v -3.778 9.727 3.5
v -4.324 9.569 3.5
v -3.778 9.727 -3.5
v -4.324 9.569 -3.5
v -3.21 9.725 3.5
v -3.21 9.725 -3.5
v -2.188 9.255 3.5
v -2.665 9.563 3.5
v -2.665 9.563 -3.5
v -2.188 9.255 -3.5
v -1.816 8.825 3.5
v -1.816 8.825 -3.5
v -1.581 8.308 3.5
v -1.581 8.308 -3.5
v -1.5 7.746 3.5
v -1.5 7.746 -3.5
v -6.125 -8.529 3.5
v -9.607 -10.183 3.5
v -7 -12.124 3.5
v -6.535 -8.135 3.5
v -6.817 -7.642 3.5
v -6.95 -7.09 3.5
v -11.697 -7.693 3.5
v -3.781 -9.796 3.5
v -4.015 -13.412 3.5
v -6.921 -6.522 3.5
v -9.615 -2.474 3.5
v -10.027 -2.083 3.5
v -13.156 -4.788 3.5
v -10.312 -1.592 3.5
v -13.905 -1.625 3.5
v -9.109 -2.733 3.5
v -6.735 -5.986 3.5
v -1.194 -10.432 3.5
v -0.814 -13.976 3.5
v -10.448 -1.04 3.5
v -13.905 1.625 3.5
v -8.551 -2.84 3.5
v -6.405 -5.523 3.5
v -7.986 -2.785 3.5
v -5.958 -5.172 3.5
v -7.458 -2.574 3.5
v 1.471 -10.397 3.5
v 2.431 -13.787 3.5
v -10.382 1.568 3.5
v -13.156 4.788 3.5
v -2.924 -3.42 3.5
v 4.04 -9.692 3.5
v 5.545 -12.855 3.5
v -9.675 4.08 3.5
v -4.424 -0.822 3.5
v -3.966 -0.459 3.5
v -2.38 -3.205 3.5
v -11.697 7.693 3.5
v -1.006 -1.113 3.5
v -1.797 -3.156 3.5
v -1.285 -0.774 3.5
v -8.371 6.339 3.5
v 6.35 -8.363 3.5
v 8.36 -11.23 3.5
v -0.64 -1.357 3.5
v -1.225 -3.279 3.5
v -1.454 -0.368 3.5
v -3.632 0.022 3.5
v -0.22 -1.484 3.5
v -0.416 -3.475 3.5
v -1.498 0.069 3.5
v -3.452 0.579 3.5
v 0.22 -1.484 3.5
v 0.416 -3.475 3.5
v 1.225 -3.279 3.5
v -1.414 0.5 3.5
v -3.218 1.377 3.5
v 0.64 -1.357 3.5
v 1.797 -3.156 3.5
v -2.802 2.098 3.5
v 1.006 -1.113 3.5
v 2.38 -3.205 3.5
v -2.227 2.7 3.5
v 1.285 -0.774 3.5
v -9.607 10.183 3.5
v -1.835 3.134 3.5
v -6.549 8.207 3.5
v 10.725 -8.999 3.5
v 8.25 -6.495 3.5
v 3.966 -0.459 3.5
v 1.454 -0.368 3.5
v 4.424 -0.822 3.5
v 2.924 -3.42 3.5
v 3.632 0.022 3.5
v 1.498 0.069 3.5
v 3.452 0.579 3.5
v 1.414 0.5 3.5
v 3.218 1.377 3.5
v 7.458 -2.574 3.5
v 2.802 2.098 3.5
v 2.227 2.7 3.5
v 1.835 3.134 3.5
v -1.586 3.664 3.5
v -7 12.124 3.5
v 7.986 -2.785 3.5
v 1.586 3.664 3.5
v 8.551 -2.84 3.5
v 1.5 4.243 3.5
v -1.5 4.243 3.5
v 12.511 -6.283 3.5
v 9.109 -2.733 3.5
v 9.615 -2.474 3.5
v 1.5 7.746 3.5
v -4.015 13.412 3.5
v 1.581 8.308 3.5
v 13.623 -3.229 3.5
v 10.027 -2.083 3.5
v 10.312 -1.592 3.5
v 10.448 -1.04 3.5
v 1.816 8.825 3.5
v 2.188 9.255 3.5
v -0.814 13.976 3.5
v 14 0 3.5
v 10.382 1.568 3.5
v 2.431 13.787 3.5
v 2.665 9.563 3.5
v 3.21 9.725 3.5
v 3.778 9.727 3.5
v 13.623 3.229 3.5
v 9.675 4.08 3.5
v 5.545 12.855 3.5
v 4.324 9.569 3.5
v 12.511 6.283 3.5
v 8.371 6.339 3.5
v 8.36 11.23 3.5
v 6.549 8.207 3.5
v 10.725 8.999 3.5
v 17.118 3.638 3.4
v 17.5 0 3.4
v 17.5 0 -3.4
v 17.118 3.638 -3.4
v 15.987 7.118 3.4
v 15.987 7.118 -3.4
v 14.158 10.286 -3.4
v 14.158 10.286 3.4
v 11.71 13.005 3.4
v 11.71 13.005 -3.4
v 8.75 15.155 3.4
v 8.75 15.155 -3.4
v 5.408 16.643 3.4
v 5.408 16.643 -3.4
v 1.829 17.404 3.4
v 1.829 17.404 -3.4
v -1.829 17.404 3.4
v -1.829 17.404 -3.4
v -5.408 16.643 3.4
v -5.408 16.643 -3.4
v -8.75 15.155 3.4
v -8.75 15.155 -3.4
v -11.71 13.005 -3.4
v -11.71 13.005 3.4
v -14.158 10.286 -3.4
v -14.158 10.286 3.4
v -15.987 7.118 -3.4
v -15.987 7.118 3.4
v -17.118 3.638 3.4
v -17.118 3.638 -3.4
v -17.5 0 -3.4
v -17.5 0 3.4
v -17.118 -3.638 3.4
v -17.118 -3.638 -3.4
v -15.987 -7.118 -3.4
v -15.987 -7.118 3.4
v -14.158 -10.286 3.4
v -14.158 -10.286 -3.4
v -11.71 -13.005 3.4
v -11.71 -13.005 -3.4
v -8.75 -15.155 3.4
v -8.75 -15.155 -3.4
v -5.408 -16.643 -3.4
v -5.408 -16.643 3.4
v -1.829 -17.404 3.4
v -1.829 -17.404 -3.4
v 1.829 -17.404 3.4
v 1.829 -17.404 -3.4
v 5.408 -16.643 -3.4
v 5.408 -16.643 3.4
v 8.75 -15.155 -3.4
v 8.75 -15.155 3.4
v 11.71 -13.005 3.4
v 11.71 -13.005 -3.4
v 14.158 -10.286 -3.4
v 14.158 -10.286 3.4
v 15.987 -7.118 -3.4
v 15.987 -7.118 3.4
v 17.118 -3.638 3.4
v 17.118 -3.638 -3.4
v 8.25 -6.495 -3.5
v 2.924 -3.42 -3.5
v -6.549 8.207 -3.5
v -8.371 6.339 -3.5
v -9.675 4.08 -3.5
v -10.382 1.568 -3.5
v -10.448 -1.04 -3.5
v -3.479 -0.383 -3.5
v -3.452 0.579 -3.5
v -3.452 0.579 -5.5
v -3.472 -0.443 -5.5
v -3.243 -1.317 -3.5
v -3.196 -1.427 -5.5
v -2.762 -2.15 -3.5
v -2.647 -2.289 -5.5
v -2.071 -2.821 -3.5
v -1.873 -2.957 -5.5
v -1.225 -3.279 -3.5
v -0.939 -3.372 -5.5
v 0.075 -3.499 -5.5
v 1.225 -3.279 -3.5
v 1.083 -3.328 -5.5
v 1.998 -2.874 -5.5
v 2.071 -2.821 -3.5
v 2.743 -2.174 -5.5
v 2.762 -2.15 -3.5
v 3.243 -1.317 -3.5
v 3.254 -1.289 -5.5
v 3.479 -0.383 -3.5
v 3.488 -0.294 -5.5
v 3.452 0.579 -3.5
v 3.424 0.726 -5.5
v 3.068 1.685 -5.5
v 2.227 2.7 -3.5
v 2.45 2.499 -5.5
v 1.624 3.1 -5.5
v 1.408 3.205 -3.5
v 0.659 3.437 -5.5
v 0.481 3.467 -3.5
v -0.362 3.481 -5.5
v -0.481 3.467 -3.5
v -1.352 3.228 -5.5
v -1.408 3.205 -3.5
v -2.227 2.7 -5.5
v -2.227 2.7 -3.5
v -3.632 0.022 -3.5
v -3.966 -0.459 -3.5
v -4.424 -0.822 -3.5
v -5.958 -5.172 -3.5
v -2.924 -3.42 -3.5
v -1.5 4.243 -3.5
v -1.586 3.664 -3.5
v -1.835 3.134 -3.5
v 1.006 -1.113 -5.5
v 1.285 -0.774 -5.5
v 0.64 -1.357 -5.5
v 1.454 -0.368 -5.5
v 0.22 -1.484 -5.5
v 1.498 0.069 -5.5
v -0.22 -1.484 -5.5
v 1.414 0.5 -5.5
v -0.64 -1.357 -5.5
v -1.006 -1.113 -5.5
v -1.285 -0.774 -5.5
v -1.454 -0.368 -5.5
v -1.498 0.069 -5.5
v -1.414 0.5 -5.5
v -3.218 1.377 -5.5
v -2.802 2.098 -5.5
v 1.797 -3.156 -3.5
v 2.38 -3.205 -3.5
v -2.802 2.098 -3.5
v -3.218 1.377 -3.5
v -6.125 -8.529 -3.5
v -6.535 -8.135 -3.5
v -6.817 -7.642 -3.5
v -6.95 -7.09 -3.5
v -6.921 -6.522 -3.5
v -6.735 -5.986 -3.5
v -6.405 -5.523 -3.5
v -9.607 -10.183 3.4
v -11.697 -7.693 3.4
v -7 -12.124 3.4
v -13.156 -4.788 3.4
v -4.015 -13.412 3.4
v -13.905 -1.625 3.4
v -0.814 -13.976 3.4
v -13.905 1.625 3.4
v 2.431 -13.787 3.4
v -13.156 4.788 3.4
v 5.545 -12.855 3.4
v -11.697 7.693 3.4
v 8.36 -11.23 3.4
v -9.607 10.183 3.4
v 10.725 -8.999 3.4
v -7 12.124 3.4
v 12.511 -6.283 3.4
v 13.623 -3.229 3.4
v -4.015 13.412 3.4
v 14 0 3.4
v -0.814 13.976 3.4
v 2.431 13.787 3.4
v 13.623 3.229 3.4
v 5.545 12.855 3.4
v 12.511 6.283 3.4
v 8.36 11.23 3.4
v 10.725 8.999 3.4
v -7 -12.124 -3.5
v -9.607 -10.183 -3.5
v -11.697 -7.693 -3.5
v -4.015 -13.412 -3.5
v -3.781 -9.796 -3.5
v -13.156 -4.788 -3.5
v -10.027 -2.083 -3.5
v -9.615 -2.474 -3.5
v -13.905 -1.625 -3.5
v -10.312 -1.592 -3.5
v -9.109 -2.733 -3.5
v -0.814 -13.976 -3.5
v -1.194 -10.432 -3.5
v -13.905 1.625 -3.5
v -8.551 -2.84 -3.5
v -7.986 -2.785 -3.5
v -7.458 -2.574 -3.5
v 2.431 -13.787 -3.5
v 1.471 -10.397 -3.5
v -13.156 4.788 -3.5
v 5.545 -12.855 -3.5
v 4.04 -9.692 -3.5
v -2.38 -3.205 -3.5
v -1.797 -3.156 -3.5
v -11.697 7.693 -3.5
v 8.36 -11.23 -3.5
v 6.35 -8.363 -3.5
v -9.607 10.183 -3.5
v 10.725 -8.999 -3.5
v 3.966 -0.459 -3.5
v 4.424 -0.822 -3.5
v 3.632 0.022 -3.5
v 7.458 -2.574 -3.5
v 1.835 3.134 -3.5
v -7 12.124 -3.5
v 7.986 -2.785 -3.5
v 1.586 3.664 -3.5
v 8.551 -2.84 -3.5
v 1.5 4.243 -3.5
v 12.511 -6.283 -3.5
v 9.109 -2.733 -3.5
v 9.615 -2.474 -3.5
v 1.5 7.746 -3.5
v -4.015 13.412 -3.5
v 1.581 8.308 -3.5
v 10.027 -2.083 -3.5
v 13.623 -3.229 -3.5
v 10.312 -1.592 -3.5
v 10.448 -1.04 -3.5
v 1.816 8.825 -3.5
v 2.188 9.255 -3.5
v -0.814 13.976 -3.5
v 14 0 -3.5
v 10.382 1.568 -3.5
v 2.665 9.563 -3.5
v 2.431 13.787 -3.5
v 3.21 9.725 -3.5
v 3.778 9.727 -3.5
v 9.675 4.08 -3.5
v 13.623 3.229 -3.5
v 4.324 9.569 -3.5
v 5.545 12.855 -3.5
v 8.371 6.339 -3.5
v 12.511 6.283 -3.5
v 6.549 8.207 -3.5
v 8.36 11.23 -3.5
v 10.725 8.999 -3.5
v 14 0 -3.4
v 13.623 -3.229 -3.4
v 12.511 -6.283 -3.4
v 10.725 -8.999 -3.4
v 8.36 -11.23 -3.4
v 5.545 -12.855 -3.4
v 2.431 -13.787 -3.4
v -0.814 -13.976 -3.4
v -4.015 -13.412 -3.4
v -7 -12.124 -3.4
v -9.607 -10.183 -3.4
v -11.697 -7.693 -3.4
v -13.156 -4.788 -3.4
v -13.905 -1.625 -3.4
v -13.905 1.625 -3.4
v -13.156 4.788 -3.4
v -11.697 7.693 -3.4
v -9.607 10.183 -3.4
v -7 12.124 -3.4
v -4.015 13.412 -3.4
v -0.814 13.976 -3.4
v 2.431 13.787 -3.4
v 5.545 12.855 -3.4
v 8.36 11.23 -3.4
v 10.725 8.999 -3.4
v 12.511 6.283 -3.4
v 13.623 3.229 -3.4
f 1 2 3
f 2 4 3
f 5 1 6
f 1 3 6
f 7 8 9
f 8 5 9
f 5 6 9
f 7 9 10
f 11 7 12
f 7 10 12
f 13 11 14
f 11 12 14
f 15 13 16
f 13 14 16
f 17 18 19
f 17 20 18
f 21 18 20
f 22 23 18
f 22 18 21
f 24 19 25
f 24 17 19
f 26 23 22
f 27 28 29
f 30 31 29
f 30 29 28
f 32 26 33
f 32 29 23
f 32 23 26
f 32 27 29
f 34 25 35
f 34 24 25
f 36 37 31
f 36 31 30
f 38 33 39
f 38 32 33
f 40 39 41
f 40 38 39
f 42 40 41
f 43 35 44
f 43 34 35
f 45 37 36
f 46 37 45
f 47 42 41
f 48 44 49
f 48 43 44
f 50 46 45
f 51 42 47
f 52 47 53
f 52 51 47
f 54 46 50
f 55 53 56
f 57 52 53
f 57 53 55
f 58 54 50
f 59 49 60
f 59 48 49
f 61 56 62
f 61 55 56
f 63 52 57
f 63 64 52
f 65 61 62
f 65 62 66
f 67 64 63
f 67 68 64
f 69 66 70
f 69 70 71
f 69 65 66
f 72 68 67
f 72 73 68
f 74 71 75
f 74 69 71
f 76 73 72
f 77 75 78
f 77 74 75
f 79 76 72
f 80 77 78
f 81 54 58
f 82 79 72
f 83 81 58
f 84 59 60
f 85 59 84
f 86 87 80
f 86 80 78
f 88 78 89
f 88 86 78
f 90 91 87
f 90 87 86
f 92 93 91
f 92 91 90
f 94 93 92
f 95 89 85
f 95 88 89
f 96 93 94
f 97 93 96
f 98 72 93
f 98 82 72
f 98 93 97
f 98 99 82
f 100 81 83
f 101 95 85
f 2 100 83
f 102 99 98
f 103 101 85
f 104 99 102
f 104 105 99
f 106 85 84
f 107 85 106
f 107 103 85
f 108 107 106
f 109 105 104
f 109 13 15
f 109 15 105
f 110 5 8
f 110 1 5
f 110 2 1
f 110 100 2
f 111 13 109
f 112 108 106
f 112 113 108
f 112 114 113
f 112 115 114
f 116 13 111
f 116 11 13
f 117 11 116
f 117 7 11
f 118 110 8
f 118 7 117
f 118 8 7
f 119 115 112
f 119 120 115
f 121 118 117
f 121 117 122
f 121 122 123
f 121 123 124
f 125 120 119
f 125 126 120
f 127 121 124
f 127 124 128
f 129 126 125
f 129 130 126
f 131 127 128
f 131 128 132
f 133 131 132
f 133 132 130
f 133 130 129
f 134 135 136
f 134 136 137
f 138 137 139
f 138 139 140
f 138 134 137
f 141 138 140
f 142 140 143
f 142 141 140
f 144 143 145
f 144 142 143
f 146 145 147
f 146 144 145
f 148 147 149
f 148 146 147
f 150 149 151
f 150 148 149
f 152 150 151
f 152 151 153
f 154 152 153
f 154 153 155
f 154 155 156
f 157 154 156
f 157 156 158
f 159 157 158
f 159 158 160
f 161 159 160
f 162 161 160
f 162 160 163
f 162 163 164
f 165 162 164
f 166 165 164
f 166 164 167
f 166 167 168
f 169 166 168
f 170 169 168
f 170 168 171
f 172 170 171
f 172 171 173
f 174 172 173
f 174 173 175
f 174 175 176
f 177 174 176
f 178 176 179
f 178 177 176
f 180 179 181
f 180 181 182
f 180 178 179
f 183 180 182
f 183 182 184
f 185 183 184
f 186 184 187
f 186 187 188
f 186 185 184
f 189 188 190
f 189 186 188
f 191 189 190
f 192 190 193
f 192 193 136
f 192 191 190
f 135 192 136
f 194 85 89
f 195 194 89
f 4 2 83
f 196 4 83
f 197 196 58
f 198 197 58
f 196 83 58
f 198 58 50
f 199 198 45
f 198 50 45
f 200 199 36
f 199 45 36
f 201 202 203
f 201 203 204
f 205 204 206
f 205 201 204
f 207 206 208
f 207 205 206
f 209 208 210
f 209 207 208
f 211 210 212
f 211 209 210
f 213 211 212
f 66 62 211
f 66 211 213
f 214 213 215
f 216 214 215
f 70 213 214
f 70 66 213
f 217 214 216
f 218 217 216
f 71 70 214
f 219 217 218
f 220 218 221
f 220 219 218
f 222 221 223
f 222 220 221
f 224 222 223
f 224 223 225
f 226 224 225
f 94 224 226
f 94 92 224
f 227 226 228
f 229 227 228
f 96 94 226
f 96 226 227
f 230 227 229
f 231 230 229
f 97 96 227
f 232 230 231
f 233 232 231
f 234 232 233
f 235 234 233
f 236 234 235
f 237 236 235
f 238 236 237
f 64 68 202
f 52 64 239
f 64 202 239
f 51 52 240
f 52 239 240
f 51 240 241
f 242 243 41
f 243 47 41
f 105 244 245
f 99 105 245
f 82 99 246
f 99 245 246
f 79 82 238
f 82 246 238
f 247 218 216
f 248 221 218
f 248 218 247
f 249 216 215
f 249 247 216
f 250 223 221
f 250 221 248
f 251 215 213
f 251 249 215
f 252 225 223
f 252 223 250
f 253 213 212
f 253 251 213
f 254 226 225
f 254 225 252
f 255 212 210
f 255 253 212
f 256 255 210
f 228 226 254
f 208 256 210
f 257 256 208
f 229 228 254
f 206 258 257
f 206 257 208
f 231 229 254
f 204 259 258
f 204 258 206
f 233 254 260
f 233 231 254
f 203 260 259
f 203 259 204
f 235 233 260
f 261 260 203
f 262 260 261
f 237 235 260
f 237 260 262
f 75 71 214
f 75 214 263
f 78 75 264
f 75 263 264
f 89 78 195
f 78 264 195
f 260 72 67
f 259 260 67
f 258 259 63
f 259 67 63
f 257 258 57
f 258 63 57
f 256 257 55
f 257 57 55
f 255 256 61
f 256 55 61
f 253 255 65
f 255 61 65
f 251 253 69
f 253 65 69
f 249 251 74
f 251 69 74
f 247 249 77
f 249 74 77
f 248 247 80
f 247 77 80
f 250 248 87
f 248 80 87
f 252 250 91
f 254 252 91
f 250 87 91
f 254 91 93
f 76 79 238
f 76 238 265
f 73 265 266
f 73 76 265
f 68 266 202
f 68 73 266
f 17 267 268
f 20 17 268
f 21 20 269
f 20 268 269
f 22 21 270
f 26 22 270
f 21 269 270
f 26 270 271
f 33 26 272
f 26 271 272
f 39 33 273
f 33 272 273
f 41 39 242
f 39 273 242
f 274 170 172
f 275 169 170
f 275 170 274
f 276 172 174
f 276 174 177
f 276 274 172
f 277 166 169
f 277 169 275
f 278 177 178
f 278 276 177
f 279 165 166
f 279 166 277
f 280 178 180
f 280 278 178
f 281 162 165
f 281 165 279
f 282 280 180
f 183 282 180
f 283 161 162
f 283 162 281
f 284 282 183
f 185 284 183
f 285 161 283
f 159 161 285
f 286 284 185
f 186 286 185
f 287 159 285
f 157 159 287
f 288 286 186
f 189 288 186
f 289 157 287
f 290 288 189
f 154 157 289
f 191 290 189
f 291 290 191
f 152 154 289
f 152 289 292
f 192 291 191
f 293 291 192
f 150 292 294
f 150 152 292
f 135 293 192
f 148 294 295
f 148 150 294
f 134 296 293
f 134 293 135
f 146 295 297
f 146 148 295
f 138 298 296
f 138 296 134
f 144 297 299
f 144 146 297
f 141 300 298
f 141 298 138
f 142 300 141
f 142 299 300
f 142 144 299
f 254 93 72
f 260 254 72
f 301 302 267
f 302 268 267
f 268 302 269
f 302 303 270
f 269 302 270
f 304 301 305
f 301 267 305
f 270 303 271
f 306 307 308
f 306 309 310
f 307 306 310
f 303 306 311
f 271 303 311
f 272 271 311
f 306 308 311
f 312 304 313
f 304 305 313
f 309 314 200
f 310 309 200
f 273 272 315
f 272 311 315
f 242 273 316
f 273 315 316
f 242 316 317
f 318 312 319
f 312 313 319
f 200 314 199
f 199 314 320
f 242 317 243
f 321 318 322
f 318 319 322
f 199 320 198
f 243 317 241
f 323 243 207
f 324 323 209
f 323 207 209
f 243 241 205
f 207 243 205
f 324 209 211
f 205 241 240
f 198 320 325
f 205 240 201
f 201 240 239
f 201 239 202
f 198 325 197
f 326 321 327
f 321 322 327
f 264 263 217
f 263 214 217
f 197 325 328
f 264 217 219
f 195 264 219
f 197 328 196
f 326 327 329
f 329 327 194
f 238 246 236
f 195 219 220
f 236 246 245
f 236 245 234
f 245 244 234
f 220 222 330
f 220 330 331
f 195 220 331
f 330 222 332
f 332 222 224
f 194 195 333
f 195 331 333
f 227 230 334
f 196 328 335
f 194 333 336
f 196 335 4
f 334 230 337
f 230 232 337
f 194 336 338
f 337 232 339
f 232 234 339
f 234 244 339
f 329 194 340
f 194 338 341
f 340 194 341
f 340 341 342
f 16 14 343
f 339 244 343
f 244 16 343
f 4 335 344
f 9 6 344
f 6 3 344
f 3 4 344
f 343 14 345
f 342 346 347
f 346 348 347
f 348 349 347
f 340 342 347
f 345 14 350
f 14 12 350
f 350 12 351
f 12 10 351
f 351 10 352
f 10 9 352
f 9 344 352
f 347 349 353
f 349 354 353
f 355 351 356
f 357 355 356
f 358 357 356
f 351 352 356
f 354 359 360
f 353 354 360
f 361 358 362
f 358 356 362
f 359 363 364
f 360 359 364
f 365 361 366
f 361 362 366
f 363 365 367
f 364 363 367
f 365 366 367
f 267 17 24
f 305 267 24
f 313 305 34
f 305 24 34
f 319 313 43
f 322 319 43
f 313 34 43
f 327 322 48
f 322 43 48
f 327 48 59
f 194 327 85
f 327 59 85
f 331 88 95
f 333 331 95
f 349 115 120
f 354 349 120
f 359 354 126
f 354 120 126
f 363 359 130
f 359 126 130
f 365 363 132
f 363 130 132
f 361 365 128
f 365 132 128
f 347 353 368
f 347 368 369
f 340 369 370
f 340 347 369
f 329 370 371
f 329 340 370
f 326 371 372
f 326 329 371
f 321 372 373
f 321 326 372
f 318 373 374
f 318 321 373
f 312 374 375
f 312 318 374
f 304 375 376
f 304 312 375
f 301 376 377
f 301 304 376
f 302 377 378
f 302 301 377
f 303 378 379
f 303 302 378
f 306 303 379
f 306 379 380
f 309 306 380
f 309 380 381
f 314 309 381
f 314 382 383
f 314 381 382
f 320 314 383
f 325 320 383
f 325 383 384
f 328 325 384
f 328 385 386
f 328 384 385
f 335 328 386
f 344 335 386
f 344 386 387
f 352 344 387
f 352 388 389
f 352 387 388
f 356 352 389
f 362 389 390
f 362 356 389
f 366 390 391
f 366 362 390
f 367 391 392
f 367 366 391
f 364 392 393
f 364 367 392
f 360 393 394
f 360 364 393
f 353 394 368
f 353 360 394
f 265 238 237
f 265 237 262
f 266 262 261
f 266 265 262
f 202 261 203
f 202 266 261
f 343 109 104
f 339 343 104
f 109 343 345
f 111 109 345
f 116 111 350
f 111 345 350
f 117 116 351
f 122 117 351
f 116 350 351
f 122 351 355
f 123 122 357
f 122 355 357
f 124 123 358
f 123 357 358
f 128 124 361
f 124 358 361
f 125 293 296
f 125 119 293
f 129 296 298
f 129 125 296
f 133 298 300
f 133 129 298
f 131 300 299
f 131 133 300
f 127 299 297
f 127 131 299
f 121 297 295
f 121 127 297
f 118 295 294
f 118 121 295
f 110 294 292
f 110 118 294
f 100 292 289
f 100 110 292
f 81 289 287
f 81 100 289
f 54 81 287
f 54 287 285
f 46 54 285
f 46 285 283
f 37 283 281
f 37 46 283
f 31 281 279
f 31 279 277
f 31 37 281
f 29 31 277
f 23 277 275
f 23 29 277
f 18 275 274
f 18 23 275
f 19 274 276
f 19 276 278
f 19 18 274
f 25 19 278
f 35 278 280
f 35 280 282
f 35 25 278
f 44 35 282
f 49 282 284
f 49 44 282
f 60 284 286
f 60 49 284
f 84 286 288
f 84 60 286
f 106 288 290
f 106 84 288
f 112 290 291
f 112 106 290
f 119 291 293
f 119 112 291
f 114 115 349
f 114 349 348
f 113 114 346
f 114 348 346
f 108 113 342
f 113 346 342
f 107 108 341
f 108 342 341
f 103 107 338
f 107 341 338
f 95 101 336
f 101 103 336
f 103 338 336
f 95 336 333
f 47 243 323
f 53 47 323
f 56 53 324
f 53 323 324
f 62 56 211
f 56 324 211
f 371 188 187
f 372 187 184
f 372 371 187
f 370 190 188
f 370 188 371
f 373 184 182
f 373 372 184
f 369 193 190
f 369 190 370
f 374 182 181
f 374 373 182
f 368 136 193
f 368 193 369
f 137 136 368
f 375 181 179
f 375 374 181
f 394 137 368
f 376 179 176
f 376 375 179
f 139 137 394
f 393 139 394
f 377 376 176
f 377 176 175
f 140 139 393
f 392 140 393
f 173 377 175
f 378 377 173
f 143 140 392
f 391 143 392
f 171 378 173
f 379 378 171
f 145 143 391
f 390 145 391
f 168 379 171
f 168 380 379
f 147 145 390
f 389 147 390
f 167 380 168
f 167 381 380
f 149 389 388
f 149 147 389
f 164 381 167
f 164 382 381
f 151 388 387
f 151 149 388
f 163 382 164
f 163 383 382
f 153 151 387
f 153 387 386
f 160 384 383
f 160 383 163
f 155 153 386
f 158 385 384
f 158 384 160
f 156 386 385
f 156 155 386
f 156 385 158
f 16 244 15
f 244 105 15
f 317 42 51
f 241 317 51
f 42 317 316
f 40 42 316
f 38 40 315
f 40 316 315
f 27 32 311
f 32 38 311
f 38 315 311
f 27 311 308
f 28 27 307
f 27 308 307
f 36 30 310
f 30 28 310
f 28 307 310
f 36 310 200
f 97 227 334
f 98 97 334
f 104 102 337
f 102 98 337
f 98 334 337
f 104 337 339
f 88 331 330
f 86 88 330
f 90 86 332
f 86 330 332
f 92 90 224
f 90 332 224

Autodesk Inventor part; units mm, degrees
ref_plane "YZ Plane" through (0, 0, 0) normal (1, 0, 0) x (0, 1, 0)
ref_plane "XZ Plane" through (0, 0, 0) normal (0, 1, 0) x (-1, 0, 0)
ref_plane "XY Plane" through (0, 0, 0) normal (0, 0, 1) x (1, 0, 0)
sketch "Sketch1" plane through (0, 0, 0) normal (0, 0, 1) x (1, 0, 0)
  circle A0 centre (0, 0) radius 17.5
  dimension "d0" = 35
extrude "Extrusion1" add sketch "Sketch1" along normal mid plane 7
sketch "Sketch2" plane through (0, 0, 3.5) normal (0, 0, 1) x (1, 0, 0)
  circle A0 centre (0, 0) radius 10.5
  circle A1 centre (0, 0) radius 3.5
  line L0 (1.5, 0) -> (-1.5, 0)
  line L1 (-1.5, 0) -> (-1.5, 10.5)
  line L2 (-1.5, 10.5) -> (1.5, 10.5)
  line L3 (1.5, 10.5) -> (1.5, 0)
  line L4 (0.75, -1.299) -> (-8.3433, -6.549)
  line L5 (-9.8433, -3.951) -> (-0.75, 1.299)
  line L6 (0.75, 1.299) -> (9.8433, -3.951)
  line L7 (8.3433, -6.549) -> (-0.75, -1.299)
  point P0 (0, 10.5)
  point P1 (8.25, -6.4952)
  point P2 (1.9886, -2.8802)
  point P3 (-1.9886, -2.8802)
  point P4 (-8.25, -6.4952)
  point P5 (3.4886, -0.2821)
  point P6 (9.75, -3.8971)
  point P7 (1.5, 10.3923)
  point P8 (1.5, 3.1623)
  point P9 (-9.75, -3.8971)
  point P10 (-3.4886, -0.2821)
  point P11 (-1.5, 3.1623)
  point P12 (-1.5, 10.3923)
  dimension "d3" = 21
  dimension "d4" = 7
  dimension "d5" = 3
  dimension "d8" = 360
extrude "Extrusion2" cut sketch "Sketch2" against normal through all contours A0 L6 A1 L3 | A0 L4 A1 L7 | L1 A1 L5 A0
fillet "Fillet1" radius 2 11 edges at (1.5, 3.1623, 0) (3.4886, -0.2821, 0) (9.75, -3.8971, 0) (-8.25, -6.4952, 0) (-9.75, -3.8971, 0) (-3.4886, -0.2821, 0) (-1.5, 3.1623, 0) (1.5, 10.3923, 0) (-1.5, 10.3923, 0) (-1.9886, -2.8802, 0) (1.9886, -2.8802, 0)
sketch "Sketch4" plane through (0, 0, -3.5) normal (0, 0, -1) x (-1, 0, 0)
  circle A0 centre (0, 0) radius 3.5
  arc A1 (3.4518, 0.5789) -> (2.2273, 2.6999) centre (0, 0) ccw projected
extrude "Extrusion4" add sketch "Sketch4" along normal blind 2
sketch "Sketch3" plane through (0, 0, 3.5) normal (0, 0, 1) x (1, 0, 0)
  circle A0 centre (0, 0) radius 1.5
  line L0 (1.4142, 0.5) -> (-1.4142, 0.5)
  dimension "d17" = 3
  dimension "d19" = 2
extrude "Extrusion3" cut sketch "Sketch3" against normal through all contours A0 L0 picked at (0.0393, -0.1651)
sketch "Sketch5" plane through (0, 0, 3.5) normal (0, 0, 1) x (1, 0, 0)
  circle A0 centre (0, 0) radius 14
  circle A1 centre (0, 0) radius 17.5 projected
  dimension "d22" = 28
extrude "Extrusion5" cut sketch "Sketch5" against normal blind 0.1
mirror "Mirror1" about plane through (0, 0, 0) normal (0, 0, 1) of "Extrusion5"
properties part number "front wheel v2"
